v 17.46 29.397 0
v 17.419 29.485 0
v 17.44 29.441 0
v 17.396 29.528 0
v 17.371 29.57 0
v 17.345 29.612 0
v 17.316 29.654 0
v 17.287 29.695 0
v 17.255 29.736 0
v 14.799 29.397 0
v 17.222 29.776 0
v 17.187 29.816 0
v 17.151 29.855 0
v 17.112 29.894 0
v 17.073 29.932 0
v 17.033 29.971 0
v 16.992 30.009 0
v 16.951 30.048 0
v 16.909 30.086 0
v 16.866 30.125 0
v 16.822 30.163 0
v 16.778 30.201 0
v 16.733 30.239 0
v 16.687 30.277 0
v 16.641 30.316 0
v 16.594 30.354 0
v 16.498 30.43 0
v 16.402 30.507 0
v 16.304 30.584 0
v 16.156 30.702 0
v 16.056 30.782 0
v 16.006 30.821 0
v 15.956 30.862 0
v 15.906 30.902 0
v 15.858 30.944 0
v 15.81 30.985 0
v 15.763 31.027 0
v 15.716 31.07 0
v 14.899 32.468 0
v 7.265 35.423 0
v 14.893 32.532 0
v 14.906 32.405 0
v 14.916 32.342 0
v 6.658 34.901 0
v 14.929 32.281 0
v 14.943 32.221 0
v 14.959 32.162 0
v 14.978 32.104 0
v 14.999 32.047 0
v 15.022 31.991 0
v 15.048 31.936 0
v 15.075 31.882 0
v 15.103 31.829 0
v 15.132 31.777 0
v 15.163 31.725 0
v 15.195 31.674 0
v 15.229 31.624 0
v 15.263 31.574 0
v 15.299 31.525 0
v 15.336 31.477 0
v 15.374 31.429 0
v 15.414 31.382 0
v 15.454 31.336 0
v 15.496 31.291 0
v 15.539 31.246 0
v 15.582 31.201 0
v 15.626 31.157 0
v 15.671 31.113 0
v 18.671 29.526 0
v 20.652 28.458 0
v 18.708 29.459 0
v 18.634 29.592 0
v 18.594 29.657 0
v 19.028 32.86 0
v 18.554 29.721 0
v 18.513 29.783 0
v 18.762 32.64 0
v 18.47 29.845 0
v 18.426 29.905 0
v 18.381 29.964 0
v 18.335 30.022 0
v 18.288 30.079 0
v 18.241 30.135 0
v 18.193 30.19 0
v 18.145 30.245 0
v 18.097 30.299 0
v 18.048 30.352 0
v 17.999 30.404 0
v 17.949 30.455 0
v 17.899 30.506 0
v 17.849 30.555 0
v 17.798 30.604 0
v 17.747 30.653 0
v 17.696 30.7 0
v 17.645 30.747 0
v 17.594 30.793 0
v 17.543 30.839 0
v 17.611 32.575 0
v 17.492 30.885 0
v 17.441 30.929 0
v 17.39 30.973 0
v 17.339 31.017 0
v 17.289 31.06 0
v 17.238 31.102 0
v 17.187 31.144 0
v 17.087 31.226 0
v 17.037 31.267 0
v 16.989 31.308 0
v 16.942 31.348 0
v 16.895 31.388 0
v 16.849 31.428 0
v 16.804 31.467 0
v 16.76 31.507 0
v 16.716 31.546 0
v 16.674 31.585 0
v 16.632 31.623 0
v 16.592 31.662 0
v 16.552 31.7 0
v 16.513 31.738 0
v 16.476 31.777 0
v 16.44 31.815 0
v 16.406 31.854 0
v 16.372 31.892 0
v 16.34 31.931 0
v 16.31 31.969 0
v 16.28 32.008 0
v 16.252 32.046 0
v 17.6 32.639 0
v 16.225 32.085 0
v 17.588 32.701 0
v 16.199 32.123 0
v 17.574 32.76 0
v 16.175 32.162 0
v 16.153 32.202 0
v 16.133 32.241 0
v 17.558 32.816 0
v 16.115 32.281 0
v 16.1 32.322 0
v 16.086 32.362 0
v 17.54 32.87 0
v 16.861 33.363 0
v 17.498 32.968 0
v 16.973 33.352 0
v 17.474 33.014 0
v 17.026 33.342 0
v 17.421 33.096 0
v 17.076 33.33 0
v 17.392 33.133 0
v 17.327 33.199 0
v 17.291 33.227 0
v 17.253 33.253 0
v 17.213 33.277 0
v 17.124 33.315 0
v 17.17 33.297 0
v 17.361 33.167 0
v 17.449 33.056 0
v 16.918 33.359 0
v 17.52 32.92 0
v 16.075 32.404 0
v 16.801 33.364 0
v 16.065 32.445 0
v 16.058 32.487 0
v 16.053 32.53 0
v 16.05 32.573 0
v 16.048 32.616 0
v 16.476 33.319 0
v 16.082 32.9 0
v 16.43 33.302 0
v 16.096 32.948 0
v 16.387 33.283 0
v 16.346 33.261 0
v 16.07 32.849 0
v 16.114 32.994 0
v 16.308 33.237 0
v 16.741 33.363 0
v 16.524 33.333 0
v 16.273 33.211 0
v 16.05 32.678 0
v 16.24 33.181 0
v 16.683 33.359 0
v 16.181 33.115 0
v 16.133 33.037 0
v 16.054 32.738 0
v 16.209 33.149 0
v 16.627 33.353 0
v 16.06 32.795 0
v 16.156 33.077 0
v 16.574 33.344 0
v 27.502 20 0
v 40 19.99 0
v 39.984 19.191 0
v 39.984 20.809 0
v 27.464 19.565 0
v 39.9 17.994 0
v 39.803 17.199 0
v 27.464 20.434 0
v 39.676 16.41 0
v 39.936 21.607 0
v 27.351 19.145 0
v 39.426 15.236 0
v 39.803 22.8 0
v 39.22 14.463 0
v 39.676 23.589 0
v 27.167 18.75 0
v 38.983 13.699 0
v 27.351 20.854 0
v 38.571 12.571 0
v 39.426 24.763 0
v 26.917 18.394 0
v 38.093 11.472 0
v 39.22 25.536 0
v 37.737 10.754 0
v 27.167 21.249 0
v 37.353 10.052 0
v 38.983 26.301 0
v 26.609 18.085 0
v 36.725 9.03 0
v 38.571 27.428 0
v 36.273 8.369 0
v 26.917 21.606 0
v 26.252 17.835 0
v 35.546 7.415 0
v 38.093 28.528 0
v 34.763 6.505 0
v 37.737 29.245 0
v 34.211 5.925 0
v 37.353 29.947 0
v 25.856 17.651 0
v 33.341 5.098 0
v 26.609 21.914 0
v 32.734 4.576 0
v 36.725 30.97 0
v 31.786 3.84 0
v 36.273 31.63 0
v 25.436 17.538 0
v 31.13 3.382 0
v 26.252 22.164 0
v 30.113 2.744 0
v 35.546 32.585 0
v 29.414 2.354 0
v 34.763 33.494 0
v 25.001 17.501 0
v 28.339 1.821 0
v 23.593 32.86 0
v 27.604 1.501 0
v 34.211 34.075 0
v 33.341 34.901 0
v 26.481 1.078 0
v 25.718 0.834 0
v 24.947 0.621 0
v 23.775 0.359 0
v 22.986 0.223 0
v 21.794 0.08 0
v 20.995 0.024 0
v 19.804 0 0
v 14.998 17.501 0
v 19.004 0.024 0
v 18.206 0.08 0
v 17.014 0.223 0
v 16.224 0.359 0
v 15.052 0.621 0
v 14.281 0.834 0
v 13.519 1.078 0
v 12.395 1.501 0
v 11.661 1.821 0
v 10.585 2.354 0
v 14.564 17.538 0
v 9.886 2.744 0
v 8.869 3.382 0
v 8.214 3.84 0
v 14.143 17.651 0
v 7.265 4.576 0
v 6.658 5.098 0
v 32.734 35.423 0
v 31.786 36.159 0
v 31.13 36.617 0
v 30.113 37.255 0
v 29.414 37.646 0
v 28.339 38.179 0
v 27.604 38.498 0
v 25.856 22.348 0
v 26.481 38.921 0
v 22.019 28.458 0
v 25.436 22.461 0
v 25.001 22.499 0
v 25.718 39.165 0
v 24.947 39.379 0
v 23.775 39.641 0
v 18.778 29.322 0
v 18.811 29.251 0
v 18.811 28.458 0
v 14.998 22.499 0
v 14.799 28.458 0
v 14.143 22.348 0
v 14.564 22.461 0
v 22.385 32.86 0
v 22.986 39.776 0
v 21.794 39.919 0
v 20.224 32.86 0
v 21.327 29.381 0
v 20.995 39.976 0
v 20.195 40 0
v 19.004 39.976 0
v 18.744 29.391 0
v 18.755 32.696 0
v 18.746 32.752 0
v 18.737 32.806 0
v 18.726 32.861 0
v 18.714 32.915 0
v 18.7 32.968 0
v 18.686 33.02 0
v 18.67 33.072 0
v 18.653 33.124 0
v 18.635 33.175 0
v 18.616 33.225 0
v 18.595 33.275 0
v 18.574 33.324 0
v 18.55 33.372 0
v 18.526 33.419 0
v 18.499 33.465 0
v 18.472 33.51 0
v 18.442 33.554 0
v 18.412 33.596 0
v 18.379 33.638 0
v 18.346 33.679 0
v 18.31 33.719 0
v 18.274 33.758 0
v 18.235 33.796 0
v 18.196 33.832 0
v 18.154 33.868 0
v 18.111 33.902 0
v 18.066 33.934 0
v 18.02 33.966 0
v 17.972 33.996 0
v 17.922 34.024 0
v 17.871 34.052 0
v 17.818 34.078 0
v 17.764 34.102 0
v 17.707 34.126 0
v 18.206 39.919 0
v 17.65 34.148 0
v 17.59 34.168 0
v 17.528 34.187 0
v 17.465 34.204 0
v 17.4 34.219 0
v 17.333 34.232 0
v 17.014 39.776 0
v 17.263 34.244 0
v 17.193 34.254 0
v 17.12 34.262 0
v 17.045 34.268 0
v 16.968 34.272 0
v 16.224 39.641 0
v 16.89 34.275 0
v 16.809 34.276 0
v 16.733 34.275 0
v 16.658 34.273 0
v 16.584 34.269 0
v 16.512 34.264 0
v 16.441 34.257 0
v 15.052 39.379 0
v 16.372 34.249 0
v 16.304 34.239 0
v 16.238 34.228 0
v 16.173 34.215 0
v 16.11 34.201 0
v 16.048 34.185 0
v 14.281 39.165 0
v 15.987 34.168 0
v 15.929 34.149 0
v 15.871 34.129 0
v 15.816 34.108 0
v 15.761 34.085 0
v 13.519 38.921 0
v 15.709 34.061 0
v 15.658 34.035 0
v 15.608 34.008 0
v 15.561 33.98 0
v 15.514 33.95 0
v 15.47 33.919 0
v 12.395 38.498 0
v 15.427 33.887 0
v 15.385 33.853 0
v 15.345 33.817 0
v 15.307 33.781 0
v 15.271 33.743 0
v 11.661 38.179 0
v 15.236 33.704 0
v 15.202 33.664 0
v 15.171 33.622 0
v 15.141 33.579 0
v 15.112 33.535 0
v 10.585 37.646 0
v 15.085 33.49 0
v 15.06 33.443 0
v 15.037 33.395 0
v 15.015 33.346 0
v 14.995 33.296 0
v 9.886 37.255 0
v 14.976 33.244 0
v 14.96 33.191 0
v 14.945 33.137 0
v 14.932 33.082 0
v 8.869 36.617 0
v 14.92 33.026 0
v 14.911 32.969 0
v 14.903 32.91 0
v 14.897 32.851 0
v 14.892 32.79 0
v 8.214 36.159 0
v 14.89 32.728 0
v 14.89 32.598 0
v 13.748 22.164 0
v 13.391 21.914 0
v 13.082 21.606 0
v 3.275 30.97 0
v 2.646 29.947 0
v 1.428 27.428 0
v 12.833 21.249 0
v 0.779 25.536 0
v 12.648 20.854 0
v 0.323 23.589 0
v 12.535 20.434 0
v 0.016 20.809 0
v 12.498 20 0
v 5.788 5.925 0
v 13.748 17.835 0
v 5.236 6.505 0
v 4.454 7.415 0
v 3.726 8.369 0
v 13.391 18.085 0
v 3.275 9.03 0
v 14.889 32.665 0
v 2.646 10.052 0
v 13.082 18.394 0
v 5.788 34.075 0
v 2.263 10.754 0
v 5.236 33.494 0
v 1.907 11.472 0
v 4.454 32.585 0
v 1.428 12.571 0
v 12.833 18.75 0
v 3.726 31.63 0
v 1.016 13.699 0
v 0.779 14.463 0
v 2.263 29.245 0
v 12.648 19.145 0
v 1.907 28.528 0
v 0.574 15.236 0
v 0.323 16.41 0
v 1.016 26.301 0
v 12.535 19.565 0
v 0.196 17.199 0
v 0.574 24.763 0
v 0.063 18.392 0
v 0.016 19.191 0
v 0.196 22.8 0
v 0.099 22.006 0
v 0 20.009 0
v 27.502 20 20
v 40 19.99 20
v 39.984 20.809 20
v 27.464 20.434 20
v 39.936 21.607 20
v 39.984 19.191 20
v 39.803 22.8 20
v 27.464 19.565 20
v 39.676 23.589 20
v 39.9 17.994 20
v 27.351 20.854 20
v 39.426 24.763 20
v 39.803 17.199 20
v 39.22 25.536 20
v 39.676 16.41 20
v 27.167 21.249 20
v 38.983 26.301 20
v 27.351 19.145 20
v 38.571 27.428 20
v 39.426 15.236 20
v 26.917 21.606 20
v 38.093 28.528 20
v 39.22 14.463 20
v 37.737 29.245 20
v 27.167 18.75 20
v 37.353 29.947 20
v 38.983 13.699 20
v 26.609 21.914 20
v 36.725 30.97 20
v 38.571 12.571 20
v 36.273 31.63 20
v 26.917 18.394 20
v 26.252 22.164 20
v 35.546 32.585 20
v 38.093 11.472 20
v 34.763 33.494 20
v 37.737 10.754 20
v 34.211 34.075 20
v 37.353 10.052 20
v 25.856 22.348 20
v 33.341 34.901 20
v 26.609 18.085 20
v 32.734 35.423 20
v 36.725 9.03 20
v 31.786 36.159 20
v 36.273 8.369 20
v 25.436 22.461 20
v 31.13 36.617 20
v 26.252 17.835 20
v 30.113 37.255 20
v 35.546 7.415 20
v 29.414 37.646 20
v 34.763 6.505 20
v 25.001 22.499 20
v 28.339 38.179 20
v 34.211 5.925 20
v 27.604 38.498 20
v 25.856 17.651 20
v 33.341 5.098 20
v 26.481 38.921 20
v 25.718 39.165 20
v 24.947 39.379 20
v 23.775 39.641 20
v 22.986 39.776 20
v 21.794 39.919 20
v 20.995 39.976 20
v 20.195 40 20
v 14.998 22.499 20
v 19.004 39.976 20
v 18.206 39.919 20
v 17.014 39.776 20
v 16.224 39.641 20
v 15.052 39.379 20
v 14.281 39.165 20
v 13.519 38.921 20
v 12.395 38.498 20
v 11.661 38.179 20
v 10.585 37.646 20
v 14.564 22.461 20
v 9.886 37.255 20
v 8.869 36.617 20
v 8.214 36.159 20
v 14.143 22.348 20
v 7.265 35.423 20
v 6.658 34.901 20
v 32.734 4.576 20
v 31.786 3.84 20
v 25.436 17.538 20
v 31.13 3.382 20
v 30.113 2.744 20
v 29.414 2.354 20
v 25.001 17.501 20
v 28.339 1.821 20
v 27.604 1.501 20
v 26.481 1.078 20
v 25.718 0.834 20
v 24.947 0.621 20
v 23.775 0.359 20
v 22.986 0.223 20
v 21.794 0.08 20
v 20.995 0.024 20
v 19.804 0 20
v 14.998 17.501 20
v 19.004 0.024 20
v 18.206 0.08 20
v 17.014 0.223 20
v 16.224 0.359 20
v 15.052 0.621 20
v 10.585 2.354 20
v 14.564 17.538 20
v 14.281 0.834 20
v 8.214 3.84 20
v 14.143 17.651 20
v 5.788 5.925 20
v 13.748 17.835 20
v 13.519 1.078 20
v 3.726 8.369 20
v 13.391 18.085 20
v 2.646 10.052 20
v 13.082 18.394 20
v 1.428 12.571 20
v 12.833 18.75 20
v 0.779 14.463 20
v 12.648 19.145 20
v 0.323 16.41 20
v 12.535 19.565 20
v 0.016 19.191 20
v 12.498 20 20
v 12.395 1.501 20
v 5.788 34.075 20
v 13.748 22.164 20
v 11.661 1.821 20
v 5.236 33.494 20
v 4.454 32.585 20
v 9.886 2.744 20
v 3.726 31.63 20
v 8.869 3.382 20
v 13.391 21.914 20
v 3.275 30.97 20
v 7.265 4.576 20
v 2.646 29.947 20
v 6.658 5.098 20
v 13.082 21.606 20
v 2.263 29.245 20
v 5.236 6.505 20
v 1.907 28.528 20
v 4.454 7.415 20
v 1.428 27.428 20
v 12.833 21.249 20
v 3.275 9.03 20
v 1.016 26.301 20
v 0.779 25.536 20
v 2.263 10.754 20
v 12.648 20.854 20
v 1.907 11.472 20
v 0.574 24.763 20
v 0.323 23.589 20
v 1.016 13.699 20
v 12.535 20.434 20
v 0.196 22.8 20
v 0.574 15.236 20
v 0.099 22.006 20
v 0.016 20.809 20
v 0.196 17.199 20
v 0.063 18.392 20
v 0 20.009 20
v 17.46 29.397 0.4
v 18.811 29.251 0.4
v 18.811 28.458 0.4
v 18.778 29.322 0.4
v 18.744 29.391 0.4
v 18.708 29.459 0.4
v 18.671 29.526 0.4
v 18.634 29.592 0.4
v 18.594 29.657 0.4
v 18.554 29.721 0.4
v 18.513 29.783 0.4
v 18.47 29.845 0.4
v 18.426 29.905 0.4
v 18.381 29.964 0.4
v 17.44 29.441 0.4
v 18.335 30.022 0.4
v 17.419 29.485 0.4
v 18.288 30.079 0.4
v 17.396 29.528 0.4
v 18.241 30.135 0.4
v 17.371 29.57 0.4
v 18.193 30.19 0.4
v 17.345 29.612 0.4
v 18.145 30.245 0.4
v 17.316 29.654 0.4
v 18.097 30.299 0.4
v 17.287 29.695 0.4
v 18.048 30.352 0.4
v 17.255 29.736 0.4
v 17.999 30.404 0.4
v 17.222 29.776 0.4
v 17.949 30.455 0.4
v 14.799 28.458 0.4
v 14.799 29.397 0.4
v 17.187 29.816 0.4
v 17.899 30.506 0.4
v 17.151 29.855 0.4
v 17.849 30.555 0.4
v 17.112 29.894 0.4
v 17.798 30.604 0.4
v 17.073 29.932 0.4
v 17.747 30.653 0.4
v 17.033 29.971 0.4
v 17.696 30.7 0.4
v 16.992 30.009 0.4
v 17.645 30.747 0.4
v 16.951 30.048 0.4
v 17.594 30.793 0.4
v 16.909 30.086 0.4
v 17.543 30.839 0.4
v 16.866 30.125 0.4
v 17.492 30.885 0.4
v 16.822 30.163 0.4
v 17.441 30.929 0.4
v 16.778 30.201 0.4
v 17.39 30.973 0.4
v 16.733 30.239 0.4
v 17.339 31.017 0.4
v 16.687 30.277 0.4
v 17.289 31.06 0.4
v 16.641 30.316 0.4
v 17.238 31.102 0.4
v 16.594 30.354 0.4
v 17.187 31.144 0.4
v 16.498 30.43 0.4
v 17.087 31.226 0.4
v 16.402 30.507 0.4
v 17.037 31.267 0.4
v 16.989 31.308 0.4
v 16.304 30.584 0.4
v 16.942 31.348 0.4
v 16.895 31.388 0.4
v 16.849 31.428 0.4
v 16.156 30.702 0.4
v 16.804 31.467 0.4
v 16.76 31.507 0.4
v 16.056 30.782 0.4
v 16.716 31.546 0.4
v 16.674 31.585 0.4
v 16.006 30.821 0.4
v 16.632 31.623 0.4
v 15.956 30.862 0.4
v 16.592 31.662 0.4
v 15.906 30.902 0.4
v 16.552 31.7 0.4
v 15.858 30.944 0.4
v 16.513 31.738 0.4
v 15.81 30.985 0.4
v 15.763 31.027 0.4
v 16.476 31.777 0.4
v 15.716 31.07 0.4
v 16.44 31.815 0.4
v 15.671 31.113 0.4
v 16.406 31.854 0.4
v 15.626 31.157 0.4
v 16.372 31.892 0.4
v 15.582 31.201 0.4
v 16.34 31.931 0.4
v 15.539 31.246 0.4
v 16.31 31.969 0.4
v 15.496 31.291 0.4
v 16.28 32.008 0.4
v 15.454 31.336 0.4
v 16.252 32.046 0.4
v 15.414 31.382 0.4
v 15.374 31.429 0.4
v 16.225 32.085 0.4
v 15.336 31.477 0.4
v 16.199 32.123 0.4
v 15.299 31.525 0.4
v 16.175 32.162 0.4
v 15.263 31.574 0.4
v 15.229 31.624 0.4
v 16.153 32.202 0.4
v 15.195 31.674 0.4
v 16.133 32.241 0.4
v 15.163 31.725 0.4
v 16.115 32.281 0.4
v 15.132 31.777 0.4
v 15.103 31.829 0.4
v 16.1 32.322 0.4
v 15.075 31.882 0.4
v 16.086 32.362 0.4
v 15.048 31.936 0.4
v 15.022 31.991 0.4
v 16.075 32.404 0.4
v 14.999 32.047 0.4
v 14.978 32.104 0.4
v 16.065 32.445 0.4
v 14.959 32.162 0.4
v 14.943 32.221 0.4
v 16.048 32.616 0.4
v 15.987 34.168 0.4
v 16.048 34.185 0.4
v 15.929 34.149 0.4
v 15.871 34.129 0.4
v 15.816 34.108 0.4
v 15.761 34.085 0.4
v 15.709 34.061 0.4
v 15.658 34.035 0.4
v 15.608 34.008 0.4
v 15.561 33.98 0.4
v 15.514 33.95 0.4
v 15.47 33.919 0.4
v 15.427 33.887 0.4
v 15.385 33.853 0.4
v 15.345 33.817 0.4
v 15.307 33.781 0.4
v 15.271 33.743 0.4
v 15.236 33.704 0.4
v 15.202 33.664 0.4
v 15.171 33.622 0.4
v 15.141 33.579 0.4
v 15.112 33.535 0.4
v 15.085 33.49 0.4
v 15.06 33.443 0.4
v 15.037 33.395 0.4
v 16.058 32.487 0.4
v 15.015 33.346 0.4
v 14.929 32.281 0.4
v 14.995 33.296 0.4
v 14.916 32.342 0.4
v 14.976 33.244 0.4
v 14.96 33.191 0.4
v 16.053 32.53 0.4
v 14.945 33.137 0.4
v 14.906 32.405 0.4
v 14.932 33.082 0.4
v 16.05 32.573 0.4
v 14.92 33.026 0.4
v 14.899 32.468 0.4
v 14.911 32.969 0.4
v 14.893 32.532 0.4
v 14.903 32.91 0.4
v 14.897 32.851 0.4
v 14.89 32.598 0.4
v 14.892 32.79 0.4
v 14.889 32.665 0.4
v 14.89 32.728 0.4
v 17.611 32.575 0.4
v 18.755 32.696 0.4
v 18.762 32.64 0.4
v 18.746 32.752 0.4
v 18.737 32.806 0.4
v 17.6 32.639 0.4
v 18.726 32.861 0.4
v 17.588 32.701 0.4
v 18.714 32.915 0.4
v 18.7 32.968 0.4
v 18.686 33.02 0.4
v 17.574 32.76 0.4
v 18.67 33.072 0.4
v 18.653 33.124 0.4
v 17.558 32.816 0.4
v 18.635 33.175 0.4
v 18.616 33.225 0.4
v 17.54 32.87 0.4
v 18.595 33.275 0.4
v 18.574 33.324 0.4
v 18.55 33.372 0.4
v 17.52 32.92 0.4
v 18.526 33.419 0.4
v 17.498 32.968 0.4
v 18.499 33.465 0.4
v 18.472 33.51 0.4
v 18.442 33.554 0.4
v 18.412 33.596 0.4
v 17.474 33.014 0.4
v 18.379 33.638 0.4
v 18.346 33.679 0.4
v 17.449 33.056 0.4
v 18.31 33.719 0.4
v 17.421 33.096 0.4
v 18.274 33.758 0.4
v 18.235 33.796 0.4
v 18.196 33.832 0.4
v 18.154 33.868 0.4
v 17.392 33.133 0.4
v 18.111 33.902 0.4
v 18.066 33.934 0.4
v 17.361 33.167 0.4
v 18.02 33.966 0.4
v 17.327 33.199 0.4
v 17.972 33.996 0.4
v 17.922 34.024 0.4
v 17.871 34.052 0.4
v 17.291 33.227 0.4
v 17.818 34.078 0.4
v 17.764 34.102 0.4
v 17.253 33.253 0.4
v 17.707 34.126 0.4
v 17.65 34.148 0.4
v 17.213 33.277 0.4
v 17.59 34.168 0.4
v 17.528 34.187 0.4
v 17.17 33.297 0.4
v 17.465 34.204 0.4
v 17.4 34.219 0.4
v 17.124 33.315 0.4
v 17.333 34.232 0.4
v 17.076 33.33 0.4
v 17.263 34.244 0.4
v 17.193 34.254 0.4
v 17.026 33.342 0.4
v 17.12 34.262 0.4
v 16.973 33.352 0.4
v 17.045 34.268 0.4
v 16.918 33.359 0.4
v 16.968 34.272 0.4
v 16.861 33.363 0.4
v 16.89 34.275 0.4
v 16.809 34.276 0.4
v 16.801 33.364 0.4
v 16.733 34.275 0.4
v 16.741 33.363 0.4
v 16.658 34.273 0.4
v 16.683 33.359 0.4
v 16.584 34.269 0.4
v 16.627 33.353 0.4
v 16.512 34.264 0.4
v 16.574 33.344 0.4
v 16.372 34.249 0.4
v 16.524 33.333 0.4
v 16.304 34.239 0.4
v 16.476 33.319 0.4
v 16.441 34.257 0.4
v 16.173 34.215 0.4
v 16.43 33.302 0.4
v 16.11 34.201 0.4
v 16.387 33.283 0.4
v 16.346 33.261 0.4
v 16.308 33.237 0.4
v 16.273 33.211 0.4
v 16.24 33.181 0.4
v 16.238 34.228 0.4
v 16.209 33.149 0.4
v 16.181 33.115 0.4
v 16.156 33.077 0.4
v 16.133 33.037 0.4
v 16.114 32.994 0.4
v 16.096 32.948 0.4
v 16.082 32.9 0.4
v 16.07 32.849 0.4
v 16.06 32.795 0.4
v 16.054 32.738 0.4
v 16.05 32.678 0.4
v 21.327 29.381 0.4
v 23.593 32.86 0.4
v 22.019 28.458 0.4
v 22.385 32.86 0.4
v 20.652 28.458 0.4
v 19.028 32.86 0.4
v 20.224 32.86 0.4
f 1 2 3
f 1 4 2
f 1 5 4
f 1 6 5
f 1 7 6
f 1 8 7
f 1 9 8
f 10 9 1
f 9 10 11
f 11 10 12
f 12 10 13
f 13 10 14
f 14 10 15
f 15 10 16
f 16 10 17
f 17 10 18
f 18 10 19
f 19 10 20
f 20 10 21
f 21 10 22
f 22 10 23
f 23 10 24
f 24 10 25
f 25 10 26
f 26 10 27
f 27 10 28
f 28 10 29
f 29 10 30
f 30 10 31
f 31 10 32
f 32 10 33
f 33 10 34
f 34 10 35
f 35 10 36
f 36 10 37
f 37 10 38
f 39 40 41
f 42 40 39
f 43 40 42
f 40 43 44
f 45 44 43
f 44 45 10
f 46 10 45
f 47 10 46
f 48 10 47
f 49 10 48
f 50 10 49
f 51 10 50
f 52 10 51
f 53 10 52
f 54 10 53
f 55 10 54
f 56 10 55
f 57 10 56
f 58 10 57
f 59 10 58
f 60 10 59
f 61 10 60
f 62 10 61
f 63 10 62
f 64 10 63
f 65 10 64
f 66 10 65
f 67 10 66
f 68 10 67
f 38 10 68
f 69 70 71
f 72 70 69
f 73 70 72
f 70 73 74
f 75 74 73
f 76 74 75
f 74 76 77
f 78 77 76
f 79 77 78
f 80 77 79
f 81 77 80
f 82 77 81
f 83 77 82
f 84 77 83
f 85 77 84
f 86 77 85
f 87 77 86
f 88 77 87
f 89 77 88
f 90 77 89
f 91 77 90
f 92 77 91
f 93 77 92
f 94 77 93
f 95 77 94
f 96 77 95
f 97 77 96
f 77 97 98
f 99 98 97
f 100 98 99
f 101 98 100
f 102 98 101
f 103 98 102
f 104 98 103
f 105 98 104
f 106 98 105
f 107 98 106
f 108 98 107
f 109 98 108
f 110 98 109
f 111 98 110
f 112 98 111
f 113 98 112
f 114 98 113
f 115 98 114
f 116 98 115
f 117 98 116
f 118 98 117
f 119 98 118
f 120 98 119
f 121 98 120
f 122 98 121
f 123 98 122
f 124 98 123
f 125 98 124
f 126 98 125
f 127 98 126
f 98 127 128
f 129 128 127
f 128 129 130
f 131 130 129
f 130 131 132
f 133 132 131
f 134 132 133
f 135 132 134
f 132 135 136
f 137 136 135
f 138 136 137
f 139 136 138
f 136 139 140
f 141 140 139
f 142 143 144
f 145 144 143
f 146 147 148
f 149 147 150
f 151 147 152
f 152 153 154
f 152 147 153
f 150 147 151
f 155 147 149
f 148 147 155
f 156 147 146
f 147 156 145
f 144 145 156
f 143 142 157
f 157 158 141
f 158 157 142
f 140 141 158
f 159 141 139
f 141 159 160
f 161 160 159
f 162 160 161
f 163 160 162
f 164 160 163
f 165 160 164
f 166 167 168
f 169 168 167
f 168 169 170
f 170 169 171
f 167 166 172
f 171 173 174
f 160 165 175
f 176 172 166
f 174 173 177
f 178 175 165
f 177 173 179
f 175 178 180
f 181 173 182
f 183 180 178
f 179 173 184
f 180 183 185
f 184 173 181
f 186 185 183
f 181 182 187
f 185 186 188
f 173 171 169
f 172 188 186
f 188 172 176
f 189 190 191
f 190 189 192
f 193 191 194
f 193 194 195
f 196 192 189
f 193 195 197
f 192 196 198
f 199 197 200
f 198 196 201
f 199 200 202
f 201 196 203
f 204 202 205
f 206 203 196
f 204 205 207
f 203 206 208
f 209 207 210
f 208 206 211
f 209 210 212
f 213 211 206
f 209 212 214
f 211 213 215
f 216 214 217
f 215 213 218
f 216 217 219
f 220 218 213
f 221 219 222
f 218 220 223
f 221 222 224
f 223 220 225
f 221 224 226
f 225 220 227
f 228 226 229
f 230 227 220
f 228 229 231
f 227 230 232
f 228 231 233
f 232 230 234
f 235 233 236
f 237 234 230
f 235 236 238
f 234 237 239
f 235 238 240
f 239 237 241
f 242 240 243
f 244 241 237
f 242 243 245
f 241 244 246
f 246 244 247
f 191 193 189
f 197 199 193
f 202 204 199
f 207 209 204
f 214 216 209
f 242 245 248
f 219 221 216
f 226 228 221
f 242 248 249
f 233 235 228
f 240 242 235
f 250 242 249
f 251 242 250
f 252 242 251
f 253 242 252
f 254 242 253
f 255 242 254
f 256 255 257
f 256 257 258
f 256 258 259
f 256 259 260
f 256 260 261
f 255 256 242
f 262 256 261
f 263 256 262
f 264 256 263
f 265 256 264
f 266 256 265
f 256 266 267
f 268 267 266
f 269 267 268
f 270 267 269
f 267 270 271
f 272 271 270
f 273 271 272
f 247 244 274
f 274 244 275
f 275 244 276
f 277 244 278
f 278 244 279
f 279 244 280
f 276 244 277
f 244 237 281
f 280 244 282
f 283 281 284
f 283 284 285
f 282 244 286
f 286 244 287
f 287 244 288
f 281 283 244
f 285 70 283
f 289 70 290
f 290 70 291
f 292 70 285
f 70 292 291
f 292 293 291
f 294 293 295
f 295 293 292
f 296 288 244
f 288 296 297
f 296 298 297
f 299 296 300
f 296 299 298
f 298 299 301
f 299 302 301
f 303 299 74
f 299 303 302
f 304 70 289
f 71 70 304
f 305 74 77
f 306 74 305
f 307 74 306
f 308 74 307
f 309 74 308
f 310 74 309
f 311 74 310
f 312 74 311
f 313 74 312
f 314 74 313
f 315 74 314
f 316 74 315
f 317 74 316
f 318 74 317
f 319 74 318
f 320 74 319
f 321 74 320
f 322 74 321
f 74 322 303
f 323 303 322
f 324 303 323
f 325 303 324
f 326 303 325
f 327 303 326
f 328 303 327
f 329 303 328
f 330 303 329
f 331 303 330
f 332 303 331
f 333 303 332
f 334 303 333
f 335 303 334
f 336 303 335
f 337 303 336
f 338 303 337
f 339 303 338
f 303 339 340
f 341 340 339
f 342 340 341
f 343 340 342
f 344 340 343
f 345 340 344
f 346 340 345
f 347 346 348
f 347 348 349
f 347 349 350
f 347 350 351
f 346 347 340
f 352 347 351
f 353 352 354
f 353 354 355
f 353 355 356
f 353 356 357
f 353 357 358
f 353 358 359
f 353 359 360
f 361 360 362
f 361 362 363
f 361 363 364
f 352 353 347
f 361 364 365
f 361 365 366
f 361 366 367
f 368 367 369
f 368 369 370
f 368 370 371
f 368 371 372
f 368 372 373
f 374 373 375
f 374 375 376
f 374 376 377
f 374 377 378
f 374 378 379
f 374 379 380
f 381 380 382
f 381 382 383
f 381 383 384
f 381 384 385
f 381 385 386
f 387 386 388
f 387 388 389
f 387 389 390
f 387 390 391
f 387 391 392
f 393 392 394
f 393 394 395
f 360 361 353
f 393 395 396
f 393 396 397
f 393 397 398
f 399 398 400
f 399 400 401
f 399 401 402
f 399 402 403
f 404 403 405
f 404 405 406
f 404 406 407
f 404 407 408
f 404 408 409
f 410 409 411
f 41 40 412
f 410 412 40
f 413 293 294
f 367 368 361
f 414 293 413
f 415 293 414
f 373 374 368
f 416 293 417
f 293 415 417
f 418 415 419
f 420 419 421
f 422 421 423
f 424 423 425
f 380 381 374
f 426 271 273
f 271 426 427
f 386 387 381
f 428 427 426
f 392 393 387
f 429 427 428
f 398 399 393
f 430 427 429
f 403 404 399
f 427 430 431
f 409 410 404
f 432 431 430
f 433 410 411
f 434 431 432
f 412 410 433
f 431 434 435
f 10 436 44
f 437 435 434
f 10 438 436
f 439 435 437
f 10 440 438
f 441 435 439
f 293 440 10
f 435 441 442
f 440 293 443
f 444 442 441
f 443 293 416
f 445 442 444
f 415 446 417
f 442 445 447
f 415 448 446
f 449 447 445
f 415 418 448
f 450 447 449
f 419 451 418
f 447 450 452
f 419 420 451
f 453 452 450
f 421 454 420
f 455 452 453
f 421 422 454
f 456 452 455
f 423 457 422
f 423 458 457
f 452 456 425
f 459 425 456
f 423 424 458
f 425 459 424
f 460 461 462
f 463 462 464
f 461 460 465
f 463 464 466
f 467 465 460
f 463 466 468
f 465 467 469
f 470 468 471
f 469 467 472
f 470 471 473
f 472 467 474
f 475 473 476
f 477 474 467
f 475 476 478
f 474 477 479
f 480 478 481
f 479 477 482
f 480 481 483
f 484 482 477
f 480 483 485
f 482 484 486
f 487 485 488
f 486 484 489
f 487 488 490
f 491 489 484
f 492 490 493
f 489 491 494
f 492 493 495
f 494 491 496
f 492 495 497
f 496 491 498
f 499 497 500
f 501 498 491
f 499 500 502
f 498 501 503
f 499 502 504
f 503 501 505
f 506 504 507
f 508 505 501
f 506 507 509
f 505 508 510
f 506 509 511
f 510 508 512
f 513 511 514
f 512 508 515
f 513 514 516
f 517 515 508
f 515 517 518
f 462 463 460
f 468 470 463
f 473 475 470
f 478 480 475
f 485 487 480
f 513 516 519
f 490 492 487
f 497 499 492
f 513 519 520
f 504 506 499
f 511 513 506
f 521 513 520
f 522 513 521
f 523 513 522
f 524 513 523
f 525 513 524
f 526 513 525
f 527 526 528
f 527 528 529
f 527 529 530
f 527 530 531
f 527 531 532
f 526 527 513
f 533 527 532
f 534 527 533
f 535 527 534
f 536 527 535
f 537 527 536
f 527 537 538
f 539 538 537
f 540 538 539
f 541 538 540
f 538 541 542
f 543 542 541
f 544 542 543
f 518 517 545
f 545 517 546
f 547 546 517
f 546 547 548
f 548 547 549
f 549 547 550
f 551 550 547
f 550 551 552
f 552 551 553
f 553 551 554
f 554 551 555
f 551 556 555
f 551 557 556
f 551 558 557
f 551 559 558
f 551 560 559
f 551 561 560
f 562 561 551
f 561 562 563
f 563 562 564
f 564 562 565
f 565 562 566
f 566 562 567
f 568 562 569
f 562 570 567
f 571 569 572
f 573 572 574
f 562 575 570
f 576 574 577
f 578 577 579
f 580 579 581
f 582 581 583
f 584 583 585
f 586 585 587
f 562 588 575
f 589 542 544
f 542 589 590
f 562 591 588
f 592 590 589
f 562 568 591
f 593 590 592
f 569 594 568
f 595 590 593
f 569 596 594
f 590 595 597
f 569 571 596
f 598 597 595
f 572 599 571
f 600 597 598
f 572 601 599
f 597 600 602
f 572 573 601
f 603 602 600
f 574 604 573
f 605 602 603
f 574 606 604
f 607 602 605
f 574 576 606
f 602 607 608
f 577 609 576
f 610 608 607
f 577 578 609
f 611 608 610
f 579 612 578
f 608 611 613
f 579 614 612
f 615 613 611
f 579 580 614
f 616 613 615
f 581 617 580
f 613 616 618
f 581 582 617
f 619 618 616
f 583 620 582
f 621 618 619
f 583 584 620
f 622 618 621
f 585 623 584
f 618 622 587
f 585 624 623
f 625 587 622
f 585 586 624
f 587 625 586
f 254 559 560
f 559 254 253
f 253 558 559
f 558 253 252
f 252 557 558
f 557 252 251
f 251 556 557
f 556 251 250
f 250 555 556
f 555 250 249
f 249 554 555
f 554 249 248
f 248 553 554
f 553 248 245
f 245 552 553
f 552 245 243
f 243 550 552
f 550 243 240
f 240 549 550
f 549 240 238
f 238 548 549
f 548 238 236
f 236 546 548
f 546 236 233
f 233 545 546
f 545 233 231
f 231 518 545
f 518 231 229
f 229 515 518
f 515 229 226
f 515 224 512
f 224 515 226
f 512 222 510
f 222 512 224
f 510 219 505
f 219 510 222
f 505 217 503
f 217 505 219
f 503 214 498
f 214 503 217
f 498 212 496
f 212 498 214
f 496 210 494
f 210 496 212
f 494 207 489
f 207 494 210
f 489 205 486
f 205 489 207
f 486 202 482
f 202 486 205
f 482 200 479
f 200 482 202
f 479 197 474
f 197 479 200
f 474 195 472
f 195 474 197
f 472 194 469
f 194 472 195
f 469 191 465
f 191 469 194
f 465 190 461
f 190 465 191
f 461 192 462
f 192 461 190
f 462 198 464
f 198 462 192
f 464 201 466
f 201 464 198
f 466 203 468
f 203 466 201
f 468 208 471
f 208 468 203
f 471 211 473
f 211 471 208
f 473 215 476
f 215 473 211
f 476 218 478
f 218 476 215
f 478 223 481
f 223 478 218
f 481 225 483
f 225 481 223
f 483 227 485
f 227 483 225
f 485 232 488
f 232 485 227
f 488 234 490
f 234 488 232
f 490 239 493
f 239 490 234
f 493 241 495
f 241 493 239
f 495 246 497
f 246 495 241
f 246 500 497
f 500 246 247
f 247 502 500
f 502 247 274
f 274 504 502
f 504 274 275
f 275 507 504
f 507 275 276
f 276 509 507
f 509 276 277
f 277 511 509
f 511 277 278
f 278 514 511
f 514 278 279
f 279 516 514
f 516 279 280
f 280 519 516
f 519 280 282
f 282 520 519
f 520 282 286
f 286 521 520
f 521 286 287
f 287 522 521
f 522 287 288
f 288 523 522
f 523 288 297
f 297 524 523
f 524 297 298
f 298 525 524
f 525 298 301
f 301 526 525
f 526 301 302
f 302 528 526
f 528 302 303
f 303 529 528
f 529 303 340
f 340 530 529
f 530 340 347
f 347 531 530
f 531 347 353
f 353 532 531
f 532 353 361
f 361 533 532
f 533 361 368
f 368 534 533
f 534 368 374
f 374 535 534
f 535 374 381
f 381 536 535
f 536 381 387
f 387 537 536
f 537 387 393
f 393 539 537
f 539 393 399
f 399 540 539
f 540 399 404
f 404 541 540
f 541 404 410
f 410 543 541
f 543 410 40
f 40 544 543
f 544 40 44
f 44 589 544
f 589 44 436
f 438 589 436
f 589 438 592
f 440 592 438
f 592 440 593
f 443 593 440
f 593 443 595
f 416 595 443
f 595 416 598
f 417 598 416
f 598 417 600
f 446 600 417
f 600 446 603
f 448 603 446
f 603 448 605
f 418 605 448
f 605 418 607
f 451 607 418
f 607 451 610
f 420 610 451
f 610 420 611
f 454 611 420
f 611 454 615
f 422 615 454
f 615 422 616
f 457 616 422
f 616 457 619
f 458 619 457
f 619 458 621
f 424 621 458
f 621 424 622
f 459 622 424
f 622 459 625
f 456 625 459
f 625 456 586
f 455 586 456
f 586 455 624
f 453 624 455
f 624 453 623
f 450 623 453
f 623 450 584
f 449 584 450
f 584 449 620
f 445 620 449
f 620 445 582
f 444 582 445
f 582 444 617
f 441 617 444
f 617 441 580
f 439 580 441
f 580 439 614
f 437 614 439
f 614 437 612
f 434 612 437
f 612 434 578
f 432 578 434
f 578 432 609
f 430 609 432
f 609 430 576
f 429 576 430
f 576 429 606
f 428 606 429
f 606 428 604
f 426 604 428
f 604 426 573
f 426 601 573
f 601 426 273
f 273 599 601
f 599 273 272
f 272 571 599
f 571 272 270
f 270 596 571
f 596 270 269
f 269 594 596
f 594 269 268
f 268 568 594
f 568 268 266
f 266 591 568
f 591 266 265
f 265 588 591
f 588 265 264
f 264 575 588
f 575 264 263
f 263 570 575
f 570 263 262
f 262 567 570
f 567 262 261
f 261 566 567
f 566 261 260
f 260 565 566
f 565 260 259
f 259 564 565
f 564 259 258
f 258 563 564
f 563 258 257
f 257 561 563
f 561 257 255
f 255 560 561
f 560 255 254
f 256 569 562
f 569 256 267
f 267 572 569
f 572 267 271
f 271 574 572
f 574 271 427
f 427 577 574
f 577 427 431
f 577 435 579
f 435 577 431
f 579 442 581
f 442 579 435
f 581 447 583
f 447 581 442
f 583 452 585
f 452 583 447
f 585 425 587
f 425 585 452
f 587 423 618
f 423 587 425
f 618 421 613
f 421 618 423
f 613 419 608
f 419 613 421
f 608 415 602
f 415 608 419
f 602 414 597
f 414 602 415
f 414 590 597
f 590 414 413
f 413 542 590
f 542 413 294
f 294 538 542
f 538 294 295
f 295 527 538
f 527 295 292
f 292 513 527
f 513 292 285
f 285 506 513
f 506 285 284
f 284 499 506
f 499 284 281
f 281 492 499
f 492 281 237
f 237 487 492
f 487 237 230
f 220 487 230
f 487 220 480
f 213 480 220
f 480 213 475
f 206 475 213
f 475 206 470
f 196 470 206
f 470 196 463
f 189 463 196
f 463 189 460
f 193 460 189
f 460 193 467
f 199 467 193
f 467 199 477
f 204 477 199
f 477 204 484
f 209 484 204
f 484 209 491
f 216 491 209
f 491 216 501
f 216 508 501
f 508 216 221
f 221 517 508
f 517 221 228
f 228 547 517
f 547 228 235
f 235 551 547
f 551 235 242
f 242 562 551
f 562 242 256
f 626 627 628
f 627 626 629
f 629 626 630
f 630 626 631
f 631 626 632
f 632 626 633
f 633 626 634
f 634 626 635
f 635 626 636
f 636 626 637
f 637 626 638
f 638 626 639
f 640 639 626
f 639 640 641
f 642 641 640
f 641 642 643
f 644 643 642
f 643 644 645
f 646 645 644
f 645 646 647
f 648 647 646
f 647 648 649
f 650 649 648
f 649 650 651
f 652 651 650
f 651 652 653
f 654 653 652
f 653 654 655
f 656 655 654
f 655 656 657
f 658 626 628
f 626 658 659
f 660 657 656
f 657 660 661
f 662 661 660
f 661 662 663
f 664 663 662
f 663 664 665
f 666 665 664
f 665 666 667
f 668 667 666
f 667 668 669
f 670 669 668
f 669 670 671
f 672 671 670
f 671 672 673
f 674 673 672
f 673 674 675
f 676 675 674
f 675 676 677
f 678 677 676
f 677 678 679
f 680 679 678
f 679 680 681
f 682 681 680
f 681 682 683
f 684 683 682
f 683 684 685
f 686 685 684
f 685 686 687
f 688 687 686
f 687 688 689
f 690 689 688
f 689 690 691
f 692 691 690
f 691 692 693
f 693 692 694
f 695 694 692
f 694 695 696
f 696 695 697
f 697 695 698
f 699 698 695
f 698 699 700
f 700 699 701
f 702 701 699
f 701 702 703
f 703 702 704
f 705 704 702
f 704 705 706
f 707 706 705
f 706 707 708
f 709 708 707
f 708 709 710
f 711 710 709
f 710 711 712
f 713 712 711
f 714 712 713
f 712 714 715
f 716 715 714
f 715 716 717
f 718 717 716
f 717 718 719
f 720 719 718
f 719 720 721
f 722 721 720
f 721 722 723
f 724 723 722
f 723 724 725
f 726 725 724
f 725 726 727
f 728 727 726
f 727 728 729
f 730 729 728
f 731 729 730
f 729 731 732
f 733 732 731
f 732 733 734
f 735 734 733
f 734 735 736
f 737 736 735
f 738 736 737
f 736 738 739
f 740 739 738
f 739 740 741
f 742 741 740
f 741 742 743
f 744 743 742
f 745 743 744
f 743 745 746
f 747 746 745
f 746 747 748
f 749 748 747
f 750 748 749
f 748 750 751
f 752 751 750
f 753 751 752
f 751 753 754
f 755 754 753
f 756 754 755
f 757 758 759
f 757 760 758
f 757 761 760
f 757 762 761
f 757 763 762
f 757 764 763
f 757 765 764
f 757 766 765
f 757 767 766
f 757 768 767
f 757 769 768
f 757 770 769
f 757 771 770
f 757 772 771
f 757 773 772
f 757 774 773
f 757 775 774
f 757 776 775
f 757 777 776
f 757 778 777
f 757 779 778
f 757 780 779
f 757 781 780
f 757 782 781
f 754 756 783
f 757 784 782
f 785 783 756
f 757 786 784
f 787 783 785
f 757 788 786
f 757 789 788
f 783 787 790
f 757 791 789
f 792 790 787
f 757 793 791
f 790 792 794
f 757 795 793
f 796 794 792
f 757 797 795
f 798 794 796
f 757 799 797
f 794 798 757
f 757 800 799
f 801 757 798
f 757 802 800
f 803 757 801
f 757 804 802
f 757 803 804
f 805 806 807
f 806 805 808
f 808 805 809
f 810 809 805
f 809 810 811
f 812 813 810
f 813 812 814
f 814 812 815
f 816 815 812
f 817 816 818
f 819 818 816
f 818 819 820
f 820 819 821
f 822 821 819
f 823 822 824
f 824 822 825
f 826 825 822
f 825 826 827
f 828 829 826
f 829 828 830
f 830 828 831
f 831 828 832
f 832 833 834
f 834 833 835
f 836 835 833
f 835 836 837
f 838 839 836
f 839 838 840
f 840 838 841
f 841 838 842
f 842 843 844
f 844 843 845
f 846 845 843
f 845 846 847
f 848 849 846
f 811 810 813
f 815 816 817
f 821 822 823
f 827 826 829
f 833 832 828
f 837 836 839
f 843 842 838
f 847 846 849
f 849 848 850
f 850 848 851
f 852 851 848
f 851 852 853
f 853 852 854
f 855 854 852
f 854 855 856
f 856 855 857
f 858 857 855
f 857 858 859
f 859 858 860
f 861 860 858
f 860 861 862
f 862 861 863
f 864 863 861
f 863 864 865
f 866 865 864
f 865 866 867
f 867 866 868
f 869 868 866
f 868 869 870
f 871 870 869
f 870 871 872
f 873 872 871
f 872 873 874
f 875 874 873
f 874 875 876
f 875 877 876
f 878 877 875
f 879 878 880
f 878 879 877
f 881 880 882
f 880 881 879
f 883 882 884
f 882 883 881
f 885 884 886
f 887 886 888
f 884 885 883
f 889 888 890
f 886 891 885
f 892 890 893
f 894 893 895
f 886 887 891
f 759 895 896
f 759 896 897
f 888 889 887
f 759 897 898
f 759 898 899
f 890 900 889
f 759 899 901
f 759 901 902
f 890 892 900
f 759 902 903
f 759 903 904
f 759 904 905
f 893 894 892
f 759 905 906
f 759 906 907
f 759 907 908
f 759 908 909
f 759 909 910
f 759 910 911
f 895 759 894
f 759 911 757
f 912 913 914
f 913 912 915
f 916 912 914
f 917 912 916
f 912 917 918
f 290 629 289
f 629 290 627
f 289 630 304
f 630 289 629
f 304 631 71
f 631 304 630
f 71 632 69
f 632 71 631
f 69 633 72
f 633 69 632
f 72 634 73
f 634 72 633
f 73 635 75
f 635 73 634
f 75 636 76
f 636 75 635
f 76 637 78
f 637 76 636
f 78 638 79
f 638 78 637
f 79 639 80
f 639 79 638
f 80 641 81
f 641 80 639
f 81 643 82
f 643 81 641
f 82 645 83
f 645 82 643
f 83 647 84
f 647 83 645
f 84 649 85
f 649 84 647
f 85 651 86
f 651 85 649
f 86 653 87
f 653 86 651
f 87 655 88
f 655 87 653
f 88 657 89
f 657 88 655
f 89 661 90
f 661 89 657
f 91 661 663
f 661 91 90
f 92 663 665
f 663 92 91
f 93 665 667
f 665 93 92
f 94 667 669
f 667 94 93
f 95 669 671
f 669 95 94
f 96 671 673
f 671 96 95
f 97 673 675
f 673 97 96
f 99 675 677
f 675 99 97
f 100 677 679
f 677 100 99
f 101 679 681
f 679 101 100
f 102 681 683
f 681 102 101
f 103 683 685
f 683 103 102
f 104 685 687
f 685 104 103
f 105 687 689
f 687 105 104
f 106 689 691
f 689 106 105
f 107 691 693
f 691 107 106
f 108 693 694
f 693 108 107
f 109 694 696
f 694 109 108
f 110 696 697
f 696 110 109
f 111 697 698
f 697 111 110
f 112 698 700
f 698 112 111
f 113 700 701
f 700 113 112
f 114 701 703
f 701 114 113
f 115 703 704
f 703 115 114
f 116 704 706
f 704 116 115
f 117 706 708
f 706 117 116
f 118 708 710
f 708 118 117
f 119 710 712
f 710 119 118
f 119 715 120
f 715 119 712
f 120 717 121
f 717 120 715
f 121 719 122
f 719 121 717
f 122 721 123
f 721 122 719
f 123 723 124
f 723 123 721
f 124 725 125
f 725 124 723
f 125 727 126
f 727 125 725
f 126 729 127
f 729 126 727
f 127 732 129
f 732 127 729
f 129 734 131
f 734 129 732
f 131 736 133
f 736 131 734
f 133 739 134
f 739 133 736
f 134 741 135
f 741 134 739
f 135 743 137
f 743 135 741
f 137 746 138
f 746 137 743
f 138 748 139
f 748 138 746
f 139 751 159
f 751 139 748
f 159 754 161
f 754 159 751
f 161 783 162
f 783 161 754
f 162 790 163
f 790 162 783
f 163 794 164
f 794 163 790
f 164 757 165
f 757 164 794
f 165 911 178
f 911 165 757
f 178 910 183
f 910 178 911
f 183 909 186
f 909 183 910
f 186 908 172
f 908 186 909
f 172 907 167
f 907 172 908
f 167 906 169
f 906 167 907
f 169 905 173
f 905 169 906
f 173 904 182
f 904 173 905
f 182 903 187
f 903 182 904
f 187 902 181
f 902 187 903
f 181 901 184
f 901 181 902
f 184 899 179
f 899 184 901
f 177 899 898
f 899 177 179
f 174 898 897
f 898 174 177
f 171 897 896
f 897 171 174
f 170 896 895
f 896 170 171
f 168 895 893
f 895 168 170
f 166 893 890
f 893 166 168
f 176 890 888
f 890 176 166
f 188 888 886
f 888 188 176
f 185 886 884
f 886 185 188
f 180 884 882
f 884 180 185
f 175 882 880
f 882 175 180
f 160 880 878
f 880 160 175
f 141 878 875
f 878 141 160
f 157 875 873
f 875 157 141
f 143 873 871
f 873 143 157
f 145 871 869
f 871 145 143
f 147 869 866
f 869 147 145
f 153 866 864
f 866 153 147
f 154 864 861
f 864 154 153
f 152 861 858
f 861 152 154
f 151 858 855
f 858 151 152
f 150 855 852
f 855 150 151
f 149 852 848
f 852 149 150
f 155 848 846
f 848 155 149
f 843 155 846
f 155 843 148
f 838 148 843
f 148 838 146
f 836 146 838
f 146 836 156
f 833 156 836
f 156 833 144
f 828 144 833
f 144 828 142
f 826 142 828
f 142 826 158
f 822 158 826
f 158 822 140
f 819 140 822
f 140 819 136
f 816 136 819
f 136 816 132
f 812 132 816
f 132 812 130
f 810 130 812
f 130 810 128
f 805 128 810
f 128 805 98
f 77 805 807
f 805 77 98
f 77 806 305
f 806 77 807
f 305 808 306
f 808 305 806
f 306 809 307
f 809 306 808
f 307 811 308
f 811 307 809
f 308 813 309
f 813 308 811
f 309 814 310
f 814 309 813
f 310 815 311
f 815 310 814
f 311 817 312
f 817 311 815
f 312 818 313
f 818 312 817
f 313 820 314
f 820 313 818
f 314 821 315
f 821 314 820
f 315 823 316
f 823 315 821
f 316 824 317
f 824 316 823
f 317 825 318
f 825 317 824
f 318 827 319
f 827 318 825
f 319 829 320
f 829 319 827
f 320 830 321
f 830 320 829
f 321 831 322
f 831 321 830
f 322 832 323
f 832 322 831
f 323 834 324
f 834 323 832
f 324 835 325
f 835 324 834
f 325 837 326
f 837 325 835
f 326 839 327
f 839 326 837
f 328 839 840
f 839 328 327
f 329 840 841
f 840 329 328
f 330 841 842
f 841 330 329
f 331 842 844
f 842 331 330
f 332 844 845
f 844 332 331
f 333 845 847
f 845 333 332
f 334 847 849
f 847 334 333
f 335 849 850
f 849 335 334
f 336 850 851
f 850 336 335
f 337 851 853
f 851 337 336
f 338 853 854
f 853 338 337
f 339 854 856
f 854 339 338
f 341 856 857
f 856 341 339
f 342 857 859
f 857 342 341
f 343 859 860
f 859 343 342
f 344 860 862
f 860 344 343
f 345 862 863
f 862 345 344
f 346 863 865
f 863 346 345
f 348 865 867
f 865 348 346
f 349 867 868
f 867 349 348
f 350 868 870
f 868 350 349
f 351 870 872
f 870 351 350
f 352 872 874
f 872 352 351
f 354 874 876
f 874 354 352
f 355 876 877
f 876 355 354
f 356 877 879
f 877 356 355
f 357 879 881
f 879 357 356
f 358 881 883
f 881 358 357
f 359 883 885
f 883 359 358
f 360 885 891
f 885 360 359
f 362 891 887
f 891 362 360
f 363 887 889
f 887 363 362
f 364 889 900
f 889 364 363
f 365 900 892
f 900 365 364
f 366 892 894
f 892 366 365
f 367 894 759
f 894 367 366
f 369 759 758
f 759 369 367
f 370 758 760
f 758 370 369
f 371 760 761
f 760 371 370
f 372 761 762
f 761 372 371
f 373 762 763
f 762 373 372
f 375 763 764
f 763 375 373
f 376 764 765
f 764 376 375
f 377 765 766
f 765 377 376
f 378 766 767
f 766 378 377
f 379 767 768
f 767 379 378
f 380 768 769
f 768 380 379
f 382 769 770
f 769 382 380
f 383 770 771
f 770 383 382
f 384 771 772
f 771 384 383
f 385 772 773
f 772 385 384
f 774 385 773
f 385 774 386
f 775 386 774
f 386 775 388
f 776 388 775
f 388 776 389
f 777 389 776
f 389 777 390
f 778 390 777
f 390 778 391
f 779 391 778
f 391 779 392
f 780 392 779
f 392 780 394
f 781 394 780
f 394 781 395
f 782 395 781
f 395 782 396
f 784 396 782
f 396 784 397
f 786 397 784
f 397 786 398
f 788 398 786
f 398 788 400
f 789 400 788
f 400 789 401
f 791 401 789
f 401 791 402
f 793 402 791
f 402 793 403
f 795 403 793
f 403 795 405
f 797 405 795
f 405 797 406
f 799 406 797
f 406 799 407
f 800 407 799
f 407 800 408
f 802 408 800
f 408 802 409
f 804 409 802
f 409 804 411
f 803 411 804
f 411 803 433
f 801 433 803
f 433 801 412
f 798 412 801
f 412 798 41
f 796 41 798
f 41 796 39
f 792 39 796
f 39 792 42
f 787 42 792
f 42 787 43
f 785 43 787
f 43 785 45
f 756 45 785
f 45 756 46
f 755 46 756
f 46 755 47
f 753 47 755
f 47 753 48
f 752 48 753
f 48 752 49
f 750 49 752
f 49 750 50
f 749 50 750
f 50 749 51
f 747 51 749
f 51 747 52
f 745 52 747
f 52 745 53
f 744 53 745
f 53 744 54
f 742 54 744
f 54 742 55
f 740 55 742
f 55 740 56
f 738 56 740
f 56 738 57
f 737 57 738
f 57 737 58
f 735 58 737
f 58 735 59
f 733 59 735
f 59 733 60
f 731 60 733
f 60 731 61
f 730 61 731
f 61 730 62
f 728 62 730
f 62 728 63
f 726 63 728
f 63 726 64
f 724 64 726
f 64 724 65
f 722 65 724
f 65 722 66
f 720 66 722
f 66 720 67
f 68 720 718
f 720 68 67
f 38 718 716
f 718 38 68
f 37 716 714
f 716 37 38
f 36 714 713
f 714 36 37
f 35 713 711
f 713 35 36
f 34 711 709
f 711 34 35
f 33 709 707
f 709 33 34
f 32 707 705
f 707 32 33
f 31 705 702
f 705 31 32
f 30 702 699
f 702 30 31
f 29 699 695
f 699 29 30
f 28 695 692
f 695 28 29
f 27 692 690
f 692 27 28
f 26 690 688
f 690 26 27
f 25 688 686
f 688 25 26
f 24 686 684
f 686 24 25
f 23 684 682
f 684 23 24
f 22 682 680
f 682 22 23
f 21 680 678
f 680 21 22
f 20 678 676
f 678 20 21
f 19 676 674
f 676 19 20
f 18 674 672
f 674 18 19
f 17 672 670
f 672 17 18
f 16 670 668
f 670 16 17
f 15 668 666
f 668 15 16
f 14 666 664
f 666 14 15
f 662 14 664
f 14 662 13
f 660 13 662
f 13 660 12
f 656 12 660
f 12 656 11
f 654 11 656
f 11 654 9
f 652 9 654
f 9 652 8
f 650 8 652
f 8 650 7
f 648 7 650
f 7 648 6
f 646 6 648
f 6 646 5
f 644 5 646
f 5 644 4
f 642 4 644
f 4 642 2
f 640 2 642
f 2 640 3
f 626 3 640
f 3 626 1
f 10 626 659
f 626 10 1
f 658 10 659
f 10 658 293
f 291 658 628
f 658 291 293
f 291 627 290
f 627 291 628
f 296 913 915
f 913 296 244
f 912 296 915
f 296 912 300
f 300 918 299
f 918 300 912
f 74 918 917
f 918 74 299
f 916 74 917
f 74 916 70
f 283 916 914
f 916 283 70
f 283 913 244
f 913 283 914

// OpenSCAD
// circletest — generated by protobot from a sketch (input.jpg)
// 2026-10-28
//
// Print: Prusa Core One, 0.4 mm nozzle, PLA, 0.2 mm layers, flat on the bed.
// The outline is stored in a 0..1 unit box and scaled by LENGTH/WIDTH, so
// the three measurements below are all you need to change. Re-export with:
//   openscad --backend=manifold --export-format binstl -o circletest.stl circletest.scad
//
// Dimension tags: [M] = given by the user, [S] = traced from the sketch.

/* [Measurements] */
LENGTH    = 40;   // [M] X extent, mm
WIDTH     = 40;   // [M] Y extent, mm
THICKNESS = 20;   // [M] extrusion height, mm

/* [Edge finish] */
// Perimeter edges (outline AND holes), top and bottom faces.
// "fillet" = rounded, "chamfer" = 45°, "none" = sharp. Built in LAYER steps,
// i.e. exactly as the printer will lay it down.
EDGE_TOP_KIND    = "none";
EDGE_TOP         = 0;     // mm
EDGE_BOTTOM_KIND = "none";
EDGE_BOTTOM      = 0;     // mm
LAYER            = 0.2;   // mm, print layer height

/* [Version stamp] */
VERSION        = 2;       // bump every revision
VERSION_POS    = [0.4775, 0.7825];  // [S] unit-box spot deepest inside the shape
VERSION_SIZE   = 6;      // mm text height
VERSION_DEPTH  = 0.4;    // mm, 2 layers at 0.2

/* [Screws and nuts] */
// One entry per screw hole: [x, y] in the unit box (scaled by LENGTH/WIDTH),
// then its cuts: ["circle", Ø] = screw-head recess, ["hex", across flats] =
// nut pocket, each [.., depth mm, "top"|"bottom"]. The clearance hole itself
// is part of the outline below.
FASTENERS = [];

/* [Hidden] */
// [S] traced outline (+ holes), unit box, y up.
OUTLINE_PTS = [
    [1.00000,0.49977], [0.99960,0.47978], [0.99750,0.44985], [0.99510,0.42999], [0.99191,0.41025], [0.98565,0.38091],
    [0.98050,0.36158], [0.97459,0.34248], [0.96429,0.31430], [0.95232,0.28679], [0.94343,0.26887], [0.93383,0.25132],
    [0.91813,0.22575], [0.90683,0.20924], [0.88865,0.18537], [0.86908,0.16263], [0.85529,0.14813], [0.83354,0.12746],
    [0.81836,0.11442], [0.79466,0.09602], [0.77826,0.08455], [0.75283,0.06861], [0.73536,0.05884], [0.70847,0.04552],
    [0.69012,0.03754], [0.66203,0.02697], [0.64297,0.02087], [0.62368,0.01553], [0.59439,0.00898], [0.57466,0.00559],
    [0.54486,0.00200], [0.52490,0.00060], [0.49511,0.00000], [0.47510,0.00060], [0.45514,0.00200], [0.42534,0.00559],
    [0.40561,0.00898], [0.37632,0.01553], [0.35703,0.02087], [0.33797,0.02697], [0.30988,0.03754], [0.29153,0.04552],
    [0.26464,0.05884], [0.24717,0.06861], [0.22174,0.08455], [0.20534,0.09602], [0.18164,0.11442], [0.16646,0.12746],
    [0.14471,0.14813], [0.13092,0.16263], [0.11135,0.18537], [0.09317,0.20924], [0.08187,0.22575], [0.06617,0.25132],
    [0.05657,0.26887], [0.04768,0.28679], [0.03571,0.31430], [0.02541,0.34248], [0.01950,0.36158], [0.01435,0.38091],
    [0.00809,0.41025], [0.00490,0.42999], [0.00160,0.45981], [0.00040,0.47978], [0.00000,0.50023], [0.00040,0.52022],
    [0.00250,0.55015], [0.00490,0.57001], [0.00809,0.58975], [0.01435,0.61909], [0.01950,0.63842], [0.02541,0.65752],
    [0.03571,0.68570], [0.04768,0.71321], [0.05657,0.73113], [0.06617,0.74868], [0.08187,0.77425], [0.09317,0.79076],
    [0.11135,0.81463], [0.13092,0.83737], [0.14471,0.85187], [0.16646,0.87254], [0.18164,0.88558], [0.20534,0.90398],
    [0.22174,0.91545], [0.24717,0.93139], [0.26464,0.94116], [0.29153,0.95448], [0.30988,0.96246], [0.33797,0.97303],
    [0.35703,0.97913], [0.37632,0.98447], [0.40561,0.99102], [0.42534,0.99441], [0.45514,0.99800], [0.47510,0.99940],
    [0.50489,1.00000], [0.52490,0.99940], [0.54486,0.99800], [0.57466,0.99441], [0.59439,0.99102], [0.62368,0.98447],
    [0.64297,0.97913], [0.66203,0.97303], [0.69012,0.96246], [0.70847,0.95448], [0.73536,0.94116], [0.75283,0.93139],
    [0.77826,0.91545], [0.79466,0.90398], [0.81836,0.88558], [0.83354,0.87254], [0.85529,0.85187], [0.86908,0.83737],
    [0.88865,0.81463], [0.90683,0.79076], [0.91813,0.77425], [0.93383,0.74868], [0.94343,0.73113], [0.95232,0.71321],
    [0.96429,0.68570], [0.97459,0.65752], [0.98050,0.63842], [0.98565,0.61909], [0.99191,0.58975], [0.99510,0.57001],
    [0.99840,0.54019], [0.99960,0.52022], [0.31339,0.48915], [0.31621,0.47863], [0.32082,0.46876], [0.32707,0.45984],
    [0.33477,0.45214], [0.34370,0.44589], [0.35358,0.44129], [0.36410,0.43847], [0.37496,0.43752], [0.62504,0.43752],
    [0.63590,0.43847], [0.64642,0.44129], [0.65630,0.44589], [0.66523,0.45214], [0.67293,0.45984], [0.67918,0.46876],
    [0.68379,0.47863], [0.68661,0.48915], [0.68756,0.50000], [0.68661,0.51085], [0.68379,0.52137], [0.67918,0.53124],
    [0.67293,0.54016], [0.66523,0.54786], [0.65630,0.55411], [0.64642,0.55871], [0.63590,0.56153], [0.62504,0.56248],
    [0.37496,0.56248], [0.36410,0.56153], [0.35358,0.55871], [0.34370,0.55411], [0.33477,0.54786], [0.32707,0.54016],
    [0.32082,0.53124], [0.31621,0.52137], [0.31339,0.51085], [0.31244,0.50000]
];
OUTLINE_PATHS = [
    [for (i = [0:127]) i],
    [for (i = [128:165]) i]
];

module outline_2d() {
    scale([LENGTH, WIDTH]) polygon(points = OUTLINE_PTS, paths = OUTLINE_PATHS);
}

// Debossed into the bottom face, mirrored so it reads from underneath.
module version_stamp() {
    if (!is_undef(VERSION_POS) && VERSION_SIZE > 0)
        translate([VERSION_POS[0] * LENGTH, VERSION_POS[1] * WIDTH, -0.01])
            linear_extrude(VERSION_DEPTH + 0.01)
                mirror([1, 0])
                    text(str("v", VERSION), size = VERSION_SIZE,
                         font = "Liberation Sans:style=Bold",
                         halign = "center", valign = "center");
}

// Screw-head recesses and nut pockets, cut into the top or bottom face.
module fastener_cuts() {
    for (f = FASTENERS) for (c = f[1])
        translate([f[0][0] * LENGTH, f[0][1] * WIDTH,
                   c[3] == "top" ? THICKNESS - c[2] : -0.01])
            linear_extrude(c[2] + 0.01 + (c[3] == "top" ? 0.01 : 0))
                if (c[0] == "hex") circle(d = c[1] / cos(30), $fn = 6);
                else circle(d = c[1]);
}

// How far the outline is pulled in at depth d (0..r) into a finished edge.
function edge_inset(kind, r, d) =
    kind == "chamfer" ? max(0, r - d) :
    kind == "fillet"  ? r - sqrt(max(0, r * r - (r - min(d, r)) * (r - min(d, r)))) : 0;

module body() {
    nb = EDGE_BOTTOM_KIND == "none" ? 0 : ceil(EDGE_BOTTOM / LAYER - 1e-6);
    nt = EDGE_TOP_KIND    == "none" ? 0 : ceil(EDGE_TOP / LAYER - 1e-6);
    zb = nb * LAYER;
    zt = nt * LAYER;
    union() {
        // straight-walled core, overlapping the finished layers (no shared faces)
        translate([0, 0, zb - (nb > 0 ? 0.01 : 0)])
            linear_extrude(THICKNESS - zb - zt + (nb > 0 ? 0.01 : 0) + (nt > 0 ? 0.01 : 0))
                outline_2d();
        if (nb > 0) for (i = [0 : nb - 1])
            translate([0, 0, i * LAYER])
                linear_extrude(LAYER + 0.01)
                    offset(delta = -edge_inset(EDGE_BOTTOM_KIND, EDGE_BOTTOM, (i + 0.5) * LAYER))
                        outline_2d();
        if (nt > 0) for (i = [0 : nt - 1])
            translate([0, 0, THICKNESS - (i + 1) * LAYER - (i < nt - 1 ? 0.01 : 0)])
                linear_extrude(LAYER + (i < nt - 1 ? 0.01 : 0))
                    offset(delta = -edge_inset(EDGE_TOP_KIND, EDGE_TOP, (i + 0.5) * LAYER))
                        outline_2d();
    }
}

module part() {
    $fa = 2; $fs = 0.4;
    difference() {
        body();
        version_stamp();
        fastener_cuts();
    }
}

part();
